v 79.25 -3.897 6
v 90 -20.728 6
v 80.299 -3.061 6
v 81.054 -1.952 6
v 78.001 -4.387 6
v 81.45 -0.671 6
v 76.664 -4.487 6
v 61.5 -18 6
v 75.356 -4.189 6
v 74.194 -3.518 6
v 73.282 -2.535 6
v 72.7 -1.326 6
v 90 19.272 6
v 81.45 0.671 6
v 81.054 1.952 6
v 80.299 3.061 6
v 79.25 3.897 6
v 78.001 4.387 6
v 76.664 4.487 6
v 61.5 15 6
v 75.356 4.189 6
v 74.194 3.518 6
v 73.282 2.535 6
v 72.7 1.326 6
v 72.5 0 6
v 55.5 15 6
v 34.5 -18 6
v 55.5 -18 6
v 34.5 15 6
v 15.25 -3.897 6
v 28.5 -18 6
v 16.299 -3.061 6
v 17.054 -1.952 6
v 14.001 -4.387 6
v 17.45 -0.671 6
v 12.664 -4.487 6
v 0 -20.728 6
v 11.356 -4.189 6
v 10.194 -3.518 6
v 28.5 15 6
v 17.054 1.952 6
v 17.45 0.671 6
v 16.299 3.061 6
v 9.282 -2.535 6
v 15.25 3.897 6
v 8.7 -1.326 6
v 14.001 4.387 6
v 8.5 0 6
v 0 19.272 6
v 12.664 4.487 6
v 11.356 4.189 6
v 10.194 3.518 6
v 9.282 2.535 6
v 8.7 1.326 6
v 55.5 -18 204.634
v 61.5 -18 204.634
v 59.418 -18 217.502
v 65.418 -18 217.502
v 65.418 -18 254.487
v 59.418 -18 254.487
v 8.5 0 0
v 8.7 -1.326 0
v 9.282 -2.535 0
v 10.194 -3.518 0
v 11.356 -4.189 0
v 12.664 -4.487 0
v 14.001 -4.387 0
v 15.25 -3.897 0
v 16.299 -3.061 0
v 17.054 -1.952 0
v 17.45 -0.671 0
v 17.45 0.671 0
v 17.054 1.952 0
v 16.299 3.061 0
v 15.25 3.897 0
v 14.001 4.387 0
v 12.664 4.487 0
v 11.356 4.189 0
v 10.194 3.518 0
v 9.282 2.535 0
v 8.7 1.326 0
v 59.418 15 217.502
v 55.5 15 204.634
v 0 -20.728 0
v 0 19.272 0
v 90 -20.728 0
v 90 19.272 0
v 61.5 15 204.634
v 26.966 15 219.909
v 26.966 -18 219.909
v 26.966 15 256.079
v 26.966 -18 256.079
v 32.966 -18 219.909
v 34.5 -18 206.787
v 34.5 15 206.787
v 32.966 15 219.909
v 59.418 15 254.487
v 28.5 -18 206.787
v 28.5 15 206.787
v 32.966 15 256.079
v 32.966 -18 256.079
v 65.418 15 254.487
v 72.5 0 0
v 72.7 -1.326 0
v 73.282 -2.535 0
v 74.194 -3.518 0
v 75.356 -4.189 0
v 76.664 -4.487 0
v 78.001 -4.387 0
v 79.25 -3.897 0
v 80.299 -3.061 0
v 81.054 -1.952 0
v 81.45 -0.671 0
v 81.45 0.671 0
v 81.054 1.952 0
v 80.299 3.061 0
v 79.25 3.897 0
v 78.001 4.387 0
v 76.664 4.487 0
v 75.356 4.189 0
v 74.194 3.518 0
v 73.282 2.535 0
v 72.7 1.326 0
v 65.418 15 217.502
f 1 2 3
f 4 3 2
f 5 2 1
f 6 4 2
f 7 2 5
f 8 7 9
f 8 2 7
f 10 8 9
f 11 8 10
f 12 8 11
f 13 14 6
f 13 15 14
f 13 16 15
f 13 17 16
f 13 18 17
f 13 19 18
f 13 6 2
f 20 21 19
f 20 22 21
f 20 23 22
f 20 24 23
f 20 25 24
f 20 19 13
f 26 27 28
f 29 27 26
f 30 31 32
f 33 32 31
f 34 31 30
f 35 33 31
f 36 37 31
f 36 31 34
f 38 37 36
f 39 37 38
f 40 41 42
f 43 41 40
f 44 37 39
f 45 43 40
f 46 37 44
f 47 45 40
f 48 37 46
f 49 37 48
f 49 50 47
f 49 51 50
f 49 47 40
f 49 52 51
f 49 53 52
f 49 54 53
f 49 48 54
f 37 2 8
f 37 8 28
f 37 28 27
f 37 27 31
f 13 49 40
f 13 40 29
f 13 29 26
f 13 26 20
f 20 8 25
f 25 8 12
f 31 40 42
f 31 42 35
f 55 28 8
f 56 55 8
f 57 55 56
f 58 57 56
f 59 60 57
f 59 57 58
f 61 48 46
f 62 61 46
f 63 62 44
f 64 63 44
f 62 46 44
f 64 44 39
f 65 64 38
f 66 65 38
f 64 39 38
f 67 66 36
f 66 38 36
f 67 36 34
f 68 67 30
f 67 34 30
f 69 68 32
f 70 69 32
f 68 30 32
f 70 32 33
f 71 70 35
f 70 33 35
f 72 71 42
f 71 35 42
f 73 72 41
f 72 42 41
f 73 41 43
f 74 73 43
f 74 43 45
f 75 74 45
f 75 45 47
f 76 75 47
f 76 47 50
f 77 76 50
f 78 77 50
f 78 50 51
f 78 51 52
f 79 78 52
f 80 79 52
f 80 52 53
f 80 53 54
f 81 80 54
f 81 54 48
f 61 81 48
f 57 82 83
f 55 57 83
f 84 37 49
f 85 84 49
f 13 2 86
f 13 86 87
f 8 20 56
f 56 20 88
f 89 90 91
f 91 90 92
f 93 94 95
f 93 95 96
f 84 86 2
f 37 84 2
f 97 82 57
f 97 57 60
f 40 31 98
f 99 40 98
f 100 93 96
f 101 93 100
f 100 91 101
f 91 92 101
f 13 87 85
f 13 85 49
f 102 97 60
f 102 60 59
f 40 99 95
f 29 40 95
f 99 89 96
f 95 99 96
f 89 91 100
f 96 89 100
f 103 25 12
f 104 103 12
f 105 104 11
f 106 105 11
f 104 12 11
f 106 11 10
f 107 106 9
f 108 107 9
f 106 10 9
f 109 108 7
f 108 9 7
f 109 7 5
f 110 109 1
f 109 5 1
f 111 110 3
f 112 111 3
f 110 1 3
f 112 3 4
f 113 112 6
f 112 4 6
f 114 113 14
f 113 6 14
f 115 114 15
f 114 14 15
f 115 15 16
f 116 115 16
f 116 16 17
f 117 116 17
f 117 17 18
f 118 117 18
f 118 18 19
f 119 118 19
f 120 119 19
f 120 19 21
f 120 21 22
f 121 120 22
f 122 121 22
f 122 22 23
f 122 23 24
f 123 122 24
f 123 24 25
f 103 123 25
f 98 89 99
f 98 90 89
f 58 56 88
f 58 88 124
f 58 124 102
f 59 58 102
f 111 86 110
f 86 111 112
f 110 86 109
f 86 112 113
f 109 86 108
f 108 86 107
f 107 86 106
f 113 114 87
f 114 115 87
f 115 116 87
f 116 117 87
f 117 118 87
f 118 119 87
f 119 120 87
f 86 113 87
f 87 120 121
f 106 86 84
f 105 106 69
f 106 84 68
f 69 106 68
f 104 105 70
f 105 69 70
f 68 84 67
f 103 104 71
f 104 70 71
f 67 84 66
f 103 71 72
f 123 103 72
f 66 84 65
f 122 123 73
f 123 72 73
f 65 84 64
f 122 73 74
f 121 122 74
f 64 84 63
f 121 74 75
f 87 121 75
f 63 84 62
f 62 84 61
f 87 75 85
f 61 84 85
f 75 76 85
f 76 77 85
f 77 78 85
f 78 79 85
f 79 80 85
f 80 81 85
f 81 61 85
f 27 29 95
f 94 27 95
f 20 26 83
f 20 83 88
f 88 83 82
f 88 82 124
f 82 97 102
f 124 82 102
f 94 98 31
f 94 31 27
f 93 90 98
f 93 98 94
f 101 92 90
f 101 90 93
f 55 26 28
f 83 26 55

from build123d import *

# Parameters (mm, degrees)
F0_W     = 40
F0_H     = 6
F1_DEPTH = 90
F4_D     = 9
F5_W     = 6
F5_H     = 36.9851887226
F5_H_2   = 204.6339064837
F5_H_3   = 206.7867070436
F5_H_4   = 36.1703634262
F6_DEPTH = 18
F7_DEPTH = 15


# Not quite as in the source:
# - a feature names something its author has since deleted; it is built from what else it names


with BuildPart() as f1:
    # F0 (on Right) → F1 (new body)
    with BuildSketch(Plane.YZ):
        with Locations((-0.72813743, 3)):
            Rectangle(F0_W, F0_H)
    extrude(amount=F1_DEPTH)

    # F4 (through all)
    with Locations(Plane(origin=(0, 0, 0), x_dir=(1, 0, 0), z_dir=(0, 0, -1))):
        with Locations((13, 0), (77, 0)):
            Hole(F4_D / 2)

    # F5 (on Front) → F6 (join)
    with BuildSketch(Plane.XZ):
        with Locations((62.4182647765, 235.9948903322)):
            Rectangle(F5_W, F5_H)
        Polygon((59.4182647765, 217.5022959709), (55.5, 204.6339064837), (61.5, 204.6339064837), (65.4182647765, 217.5022959709), align=None)
        with Locations((58.5, 102.3169532418)):
            Rectangle(F5_W, F5_H_2)
        with Locations((31.5, 103.3933535218)):
            Rectangle(F5_W, F5_H_3)
        Polygon((26.9661769271, 219.9091017246), (28.5, 206.7867070436), (34.5, 206.7867070436), (32.9661769271, 219.9091017246), align=None)
        with Locations((29.9661769271, 237.9942834377)):
            Rectangle(F5_W, F5_H_4)
    extrude(amount=F6_DEPTH)

    # F7 (add): faces of the model
    f7_faces = [f1.faces().sort_by_distance(p)[0] for p in [
        (31.2379126918, 0, 131.0397325754),
        (59.1846567788, 0, 130.2437423468),
    ]]
    extrude(f7_faces, amount=F7_DEPTH)


solid = f1.part
